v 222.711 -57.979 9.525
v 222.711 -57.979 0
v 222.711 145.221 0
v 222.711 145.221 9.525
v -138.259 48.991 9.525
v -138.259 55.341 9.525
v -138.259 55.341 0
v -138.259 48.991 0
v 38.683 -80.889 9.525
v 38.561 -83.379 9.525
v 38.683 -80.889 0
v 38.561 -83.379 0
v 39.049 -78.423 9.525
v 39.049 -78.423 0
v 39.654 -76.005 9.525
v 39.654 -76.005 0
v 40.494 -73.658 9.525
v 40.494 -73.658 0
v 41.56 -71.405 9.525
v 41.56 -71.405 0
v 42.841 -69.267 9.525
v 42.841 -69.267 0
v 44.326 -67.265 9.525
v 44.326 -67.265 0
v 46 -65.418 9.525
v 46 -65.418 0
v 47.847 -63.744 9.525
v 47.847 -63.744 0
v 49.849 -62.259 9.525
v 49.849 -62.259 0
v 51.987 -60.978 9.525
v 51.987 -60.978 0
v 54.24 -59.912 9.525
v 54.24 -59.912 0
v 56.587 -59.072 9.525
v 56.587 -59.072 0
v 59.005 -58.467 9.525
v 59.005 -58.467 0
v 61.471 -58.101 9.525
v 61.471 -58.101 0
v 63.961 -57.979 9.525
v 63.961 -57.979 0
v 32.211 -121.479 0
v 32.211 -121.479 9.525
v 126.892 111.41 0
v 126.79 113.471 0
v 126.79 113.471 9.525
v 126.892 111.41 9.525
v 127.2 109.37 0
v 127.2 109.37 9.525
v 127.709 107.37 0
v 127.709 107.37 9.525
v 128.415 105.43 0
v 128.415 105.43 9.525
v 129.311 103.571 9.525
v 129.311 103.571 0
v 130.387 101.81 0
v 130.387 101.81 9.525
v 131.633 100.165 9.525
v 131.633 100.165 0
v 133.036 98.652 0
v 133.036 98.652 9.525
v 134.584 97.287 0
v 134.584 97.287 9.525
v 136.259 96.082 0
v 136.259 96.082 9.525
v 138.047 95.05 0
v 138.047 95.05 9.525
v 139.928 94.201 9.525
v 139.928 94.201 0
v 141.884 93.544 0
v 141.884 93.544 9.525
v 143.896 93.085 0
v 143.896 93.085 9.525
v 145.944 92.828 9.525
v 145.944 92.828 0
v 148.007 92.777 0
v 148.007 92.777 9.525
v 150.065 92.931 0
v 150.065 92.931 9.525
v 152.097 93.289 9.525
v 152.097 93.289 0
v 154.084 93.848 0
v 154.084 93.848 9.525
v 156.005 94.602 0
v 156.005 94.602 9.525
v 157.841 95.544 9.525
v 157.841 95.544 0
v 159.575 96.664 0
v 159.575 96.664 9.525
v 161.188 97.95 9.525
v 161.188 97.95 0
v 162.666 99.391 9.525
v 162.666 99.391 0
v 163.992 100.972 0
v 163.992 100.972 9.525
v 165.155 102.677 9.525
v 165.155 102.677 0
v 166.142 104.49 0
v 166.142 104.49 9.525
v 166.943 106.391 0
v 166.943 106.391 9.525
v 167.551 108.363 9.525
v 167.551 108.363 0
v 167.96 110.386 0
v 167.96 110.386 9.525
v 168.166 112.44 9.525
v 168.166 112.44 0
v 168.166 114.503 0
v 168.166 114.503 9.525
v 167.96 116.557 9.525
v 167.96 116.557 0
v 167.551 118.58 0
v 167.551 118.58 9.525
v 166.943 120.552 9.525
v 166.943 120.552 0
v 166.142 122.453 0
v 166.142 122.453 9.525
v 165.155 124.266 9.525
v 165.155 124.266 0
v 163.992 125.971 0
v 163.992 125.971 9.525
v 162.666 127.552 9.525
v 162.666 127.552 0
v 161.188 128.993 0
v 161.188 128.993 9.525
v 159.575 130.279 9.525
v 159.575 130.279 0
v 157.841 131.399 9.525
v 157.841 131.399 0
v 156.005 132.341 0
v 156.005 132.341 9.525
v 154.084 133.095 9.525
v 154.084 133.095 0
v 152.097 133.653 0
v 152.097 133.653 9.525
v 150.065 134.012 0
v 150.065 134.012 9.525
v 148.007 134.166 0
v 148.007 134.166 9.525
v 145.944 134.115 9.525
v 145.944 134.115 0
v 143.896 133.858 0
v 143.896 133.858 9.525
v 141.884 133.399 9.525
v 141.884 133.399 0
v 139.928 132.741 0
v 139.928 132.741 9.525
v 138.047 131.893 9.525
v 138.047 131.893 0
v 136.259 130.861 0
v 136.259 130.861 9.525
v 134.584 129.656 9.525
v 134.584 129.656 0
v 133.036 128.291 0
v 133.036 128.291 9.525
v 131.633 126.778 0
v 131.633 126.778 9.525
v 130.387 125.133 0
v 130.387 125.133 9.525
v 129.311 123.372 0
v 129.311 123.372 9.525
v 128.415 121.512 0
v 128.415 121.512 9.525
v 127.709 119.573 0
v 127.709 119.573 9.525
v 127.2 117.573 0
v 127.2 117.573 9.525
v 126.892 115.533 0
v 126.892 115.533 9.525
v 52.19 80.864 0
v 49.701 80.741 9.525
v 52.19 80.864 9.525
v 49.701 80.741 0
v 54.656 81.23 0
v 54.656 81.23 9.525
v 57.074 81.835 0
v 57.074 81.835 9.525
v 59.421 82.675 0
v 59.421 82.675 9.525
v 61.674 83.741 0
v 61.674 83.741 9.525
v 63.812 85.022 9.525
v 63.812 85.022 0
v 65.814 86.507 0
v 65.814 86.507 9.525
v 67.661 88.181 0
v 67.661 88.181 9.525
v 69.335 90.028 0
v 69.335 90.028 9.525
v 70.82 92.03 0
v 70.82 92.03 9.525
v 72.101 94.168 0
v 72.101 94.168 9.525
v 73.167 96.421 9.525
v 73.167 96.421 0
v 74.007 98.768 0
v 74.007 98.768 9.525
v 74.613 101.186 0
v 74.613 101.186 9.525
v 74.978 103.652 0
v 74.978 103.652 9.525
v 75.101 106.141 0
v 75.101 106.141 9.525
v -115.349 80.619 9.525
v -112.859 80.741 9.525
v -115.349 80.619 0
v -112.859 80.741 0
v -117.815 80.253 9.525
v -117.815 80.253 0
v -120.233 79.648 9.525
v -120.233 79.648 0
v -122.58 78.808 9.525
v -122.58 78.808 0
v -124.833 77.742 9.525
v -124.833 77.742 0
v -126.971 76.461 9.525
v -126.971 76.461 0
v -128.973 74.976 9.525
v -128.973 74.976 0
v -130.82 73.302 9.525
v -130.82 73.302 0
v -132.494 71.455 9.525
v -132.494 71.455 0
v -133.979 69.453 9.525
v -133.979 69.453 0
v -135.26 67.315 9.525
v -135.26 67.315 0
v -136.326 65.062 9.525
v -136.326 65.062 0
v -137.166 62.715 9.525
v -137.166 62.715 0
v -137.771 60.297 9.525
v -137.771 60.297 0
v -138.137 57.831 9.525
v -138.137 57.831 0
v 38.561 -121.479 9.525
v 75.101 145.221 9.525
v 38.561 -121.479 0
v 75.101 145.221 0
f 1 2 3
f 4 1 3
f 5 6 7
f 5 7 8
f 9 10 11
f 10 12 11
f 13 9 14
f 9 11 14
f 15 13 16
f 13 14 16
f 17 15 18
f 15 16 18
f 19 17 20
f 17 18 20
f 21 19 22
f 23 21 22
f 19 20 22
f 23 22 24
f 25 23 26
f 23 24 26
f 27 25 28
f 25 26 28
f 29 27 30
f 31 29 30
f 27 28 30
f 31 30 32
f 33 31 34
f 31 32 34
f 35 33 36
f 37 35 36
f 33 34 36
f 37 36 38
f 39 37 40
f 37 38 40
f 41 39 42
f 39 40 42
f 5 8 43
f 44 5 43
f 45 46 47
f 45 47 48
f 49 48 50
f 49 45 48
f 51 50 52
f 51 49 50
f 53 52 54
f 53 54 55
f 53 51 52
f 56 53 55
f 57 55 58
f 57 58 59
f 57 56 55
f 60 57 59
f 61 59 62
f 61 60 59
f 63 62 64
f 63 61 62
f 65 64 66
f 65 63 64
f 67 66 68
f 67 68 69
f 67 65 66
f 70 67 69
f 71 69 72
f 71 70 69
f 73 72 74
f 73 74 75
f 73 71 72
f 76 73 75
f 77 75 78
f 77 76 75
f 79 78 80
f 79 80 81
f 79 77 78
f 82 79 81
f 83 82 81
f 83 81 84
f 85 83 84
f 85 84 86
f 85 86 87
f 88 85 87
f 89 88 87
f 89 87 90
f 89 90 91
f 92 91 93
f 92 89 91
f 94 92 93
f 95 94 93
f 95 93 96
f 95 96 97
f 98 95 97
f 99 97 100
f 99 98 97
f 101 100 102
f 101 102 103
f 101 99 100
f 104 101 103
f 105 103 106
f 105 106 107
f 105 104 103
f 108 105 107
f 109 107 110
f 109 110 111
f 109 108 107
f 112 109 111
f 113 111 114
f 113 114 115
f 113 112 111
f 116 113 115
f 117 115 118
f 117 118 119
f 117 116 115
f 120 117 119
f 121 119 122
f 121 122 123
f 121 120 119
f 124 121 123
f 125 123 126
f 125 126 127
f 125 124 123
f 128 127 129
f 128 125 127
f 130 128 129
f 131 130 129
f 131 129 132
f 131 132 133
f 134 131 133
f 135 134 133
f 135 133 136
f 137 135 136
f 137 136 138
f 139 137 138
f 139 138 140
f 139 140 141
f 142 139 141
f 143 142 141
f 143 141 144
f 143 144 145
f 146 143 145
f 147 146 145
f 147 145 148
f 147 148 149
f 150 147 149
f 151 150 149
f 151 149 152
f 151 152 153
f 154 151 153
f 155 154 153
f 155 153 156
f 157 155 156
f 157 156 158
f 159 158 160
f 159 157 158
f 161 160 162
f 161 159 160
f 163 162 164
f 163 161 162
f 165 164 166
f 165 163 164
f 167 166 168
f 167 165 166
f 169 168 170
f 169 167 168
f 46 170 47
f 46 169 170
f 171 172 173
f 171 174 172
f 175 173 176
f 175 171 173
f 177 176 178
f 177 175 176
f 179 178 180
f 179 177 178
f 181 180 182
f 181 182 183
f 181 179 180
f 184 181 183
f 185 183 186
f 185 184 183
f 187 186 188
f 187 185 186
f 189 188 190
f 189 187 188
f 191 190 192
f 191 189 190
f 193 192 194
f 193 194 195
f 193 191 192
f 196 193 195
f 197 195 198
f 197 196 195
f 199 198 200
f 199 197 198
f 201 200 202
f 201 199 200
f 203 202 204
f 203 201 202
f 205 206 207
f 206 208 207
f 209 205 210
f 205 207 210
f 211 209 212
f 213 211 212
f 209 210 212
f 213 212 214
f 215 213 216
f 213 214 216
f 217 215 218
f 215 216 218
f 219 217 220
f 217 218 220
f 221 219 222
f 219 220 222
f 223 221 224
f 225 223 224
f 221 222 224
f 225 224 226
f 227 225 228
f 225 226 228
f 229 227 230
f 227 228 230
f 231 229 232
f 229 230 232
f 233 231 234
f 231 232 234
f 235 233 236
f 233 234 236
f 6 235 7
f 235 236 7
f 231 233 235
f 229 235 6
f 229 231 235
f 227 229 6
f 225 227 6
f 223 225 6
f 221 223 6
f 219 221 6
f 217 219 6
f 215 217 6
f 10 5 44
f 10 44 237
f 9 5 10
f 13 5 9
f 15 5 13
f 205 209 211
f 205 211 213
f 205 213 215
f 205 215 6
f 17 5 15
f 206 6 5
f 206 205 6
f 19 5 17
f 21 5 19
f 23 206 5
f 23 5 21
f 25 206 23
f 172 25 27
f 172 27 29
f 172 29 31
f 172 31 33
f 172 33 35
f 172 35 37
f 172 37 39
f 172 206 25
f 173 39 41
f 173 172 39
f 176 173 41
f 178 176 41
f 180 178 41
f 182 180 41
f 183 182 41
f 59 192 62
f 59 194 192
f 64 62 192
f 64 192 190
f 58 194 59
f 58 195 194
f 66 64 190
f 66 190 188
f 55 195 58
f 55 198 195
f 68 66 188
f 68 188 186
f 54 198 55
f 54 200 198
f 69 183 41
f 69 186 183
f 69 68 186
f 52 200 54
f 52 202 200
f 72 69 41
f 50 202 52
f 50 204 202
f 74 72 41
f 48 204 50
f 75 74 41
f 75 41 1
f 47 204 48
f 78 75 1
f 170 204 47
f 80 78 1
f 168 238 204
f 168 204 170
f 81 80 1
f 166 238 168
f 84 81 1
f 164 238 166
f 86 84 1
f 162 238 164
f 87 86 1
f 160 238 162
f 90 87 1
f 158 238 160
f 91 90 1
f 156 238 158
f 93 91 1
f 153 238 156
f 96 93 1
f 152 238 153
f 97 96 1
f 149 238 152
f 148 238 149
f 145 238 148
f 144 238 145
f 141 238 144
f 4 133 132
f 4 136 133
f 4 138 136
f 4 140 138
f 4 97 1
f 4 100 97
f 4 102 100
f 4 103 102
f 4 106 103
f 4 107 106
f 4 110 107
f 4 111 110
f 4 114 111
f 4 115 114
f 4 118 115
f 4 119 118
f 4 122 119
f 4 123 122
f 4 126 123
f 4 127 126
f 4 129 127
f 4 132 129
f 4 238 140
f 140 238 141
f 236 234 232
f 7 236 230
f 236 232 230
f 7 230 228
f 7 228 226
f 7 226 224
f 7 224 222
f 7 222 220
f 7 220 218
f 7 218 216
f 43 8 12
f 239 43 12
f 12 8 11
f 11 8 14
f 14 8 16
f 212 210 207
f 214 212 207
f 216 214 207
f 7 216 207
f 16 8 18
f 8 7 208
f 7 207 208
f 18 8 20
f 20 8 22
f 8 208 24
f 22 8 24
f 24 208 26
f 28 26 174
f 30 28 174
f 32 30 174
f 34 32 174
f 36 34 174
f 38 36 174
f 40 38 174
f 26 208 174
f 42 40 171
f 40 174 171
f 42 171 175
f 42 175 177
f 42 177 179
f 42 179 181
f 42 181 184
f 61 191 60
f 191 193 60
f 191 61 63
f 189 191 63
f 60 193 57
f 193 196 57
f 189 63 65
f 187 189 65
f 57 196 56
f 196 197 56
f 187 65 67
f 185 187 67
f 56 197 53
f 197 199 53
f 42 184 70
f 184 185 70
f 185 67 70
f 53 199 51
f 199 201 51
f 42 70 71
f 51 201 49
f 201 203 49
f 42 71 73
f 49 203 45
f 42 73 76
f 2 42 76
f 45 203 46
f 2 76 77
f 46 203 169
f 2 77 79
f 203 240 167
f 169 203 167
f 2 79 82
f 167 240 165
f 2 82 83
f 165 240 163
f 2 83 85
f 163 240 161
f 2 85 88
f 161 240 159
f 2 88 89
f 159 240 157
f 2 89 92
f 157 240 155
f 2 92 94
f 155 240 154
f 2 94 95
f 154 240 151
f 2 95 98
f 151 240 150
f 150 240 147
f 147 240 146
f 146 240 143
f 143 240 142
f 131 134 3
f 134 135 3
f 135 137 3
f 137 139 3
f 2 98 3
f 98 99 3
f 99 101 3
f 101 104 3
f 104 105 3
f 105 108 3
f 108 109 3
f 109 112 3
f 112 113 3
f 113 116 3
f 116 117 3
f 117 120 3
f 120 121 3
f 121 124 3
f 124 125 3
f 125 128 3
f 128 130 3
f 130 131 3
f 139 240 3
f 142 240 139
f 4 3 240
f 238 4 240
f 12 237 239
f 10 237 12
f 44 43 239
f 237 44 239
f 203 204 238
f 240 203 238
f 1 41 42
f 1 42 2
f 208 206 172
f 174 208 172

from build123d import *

# Parameters (mm, degrees)
SKETCH1_R           = 20.701
BOSS_EXTRUDE1_DEPTH = 9.525
SKETCH2_W           = 184.15
SKETCH2_H           = 63.5
SKETCH2_W_2         = 213.36
SKETCH2_H_2         = 64.479988722
CUT_EXTRUDE1_DEPTH  = 267.045158533
FILLET1_R           = 25.4
FILLET2_R           = 25.4


with BuildPart() as part:
    # Sketch1 → Boss-Extrude1 (new body)
    with BuildSketch(Plane.XY):
        Polygon((-138.259383474, 48.991487021), (32.210627804, -121.478524257), (222.710627804, -121.478524257), (222.710627804, 145.221475743), (-138.259383474, 145.221475743), align=None)
        with Locations(Location((147.490616526, 113.471475743, 0), (0, 0, 180))):
            Circle(SKETCH1_R, mode=Mode.SUBTRACT)
    extrude(amount=BOSS_EXTRUDE1_DEPTH)

    # Sketch2 → Cut-Extrude1 (cut, through all)
    with BuildSketch(Plane.XY.offset(9.525)):
        with Locations((130.635627804, -89.728524257)):
            Rectangle(SKETCH2_W, SKETCH2_H)
        with Locations((-31.579383474, 112.981481382)):
            Rectangle(SKETCH2_W_2, SKETCH2_H_2)
    extrude(amount=-CUT_EXTRUDE1_DEPTH, mode=Mode.SUBTRACT)

    # Fillet1
    fillet1_edges = [part.edges().sort_by_distance(p)[0] for p in [
        (75.100616526, 80.741487021, 4.7625),
    ]]
    fillet(fillet1_edges, radius=FILLET1_R)

    # Fillet2
    fillet2_edges = [part.edges().sort_by_distance(p)[0] for p in [
        (38.560627804, -57.978524257, 4.7625),
        (-138.259383474, 80.741487021, 4.7625),
    ]]
    fillet(fillet2_edges, radius=FILLET2_R)


solid = part.part
